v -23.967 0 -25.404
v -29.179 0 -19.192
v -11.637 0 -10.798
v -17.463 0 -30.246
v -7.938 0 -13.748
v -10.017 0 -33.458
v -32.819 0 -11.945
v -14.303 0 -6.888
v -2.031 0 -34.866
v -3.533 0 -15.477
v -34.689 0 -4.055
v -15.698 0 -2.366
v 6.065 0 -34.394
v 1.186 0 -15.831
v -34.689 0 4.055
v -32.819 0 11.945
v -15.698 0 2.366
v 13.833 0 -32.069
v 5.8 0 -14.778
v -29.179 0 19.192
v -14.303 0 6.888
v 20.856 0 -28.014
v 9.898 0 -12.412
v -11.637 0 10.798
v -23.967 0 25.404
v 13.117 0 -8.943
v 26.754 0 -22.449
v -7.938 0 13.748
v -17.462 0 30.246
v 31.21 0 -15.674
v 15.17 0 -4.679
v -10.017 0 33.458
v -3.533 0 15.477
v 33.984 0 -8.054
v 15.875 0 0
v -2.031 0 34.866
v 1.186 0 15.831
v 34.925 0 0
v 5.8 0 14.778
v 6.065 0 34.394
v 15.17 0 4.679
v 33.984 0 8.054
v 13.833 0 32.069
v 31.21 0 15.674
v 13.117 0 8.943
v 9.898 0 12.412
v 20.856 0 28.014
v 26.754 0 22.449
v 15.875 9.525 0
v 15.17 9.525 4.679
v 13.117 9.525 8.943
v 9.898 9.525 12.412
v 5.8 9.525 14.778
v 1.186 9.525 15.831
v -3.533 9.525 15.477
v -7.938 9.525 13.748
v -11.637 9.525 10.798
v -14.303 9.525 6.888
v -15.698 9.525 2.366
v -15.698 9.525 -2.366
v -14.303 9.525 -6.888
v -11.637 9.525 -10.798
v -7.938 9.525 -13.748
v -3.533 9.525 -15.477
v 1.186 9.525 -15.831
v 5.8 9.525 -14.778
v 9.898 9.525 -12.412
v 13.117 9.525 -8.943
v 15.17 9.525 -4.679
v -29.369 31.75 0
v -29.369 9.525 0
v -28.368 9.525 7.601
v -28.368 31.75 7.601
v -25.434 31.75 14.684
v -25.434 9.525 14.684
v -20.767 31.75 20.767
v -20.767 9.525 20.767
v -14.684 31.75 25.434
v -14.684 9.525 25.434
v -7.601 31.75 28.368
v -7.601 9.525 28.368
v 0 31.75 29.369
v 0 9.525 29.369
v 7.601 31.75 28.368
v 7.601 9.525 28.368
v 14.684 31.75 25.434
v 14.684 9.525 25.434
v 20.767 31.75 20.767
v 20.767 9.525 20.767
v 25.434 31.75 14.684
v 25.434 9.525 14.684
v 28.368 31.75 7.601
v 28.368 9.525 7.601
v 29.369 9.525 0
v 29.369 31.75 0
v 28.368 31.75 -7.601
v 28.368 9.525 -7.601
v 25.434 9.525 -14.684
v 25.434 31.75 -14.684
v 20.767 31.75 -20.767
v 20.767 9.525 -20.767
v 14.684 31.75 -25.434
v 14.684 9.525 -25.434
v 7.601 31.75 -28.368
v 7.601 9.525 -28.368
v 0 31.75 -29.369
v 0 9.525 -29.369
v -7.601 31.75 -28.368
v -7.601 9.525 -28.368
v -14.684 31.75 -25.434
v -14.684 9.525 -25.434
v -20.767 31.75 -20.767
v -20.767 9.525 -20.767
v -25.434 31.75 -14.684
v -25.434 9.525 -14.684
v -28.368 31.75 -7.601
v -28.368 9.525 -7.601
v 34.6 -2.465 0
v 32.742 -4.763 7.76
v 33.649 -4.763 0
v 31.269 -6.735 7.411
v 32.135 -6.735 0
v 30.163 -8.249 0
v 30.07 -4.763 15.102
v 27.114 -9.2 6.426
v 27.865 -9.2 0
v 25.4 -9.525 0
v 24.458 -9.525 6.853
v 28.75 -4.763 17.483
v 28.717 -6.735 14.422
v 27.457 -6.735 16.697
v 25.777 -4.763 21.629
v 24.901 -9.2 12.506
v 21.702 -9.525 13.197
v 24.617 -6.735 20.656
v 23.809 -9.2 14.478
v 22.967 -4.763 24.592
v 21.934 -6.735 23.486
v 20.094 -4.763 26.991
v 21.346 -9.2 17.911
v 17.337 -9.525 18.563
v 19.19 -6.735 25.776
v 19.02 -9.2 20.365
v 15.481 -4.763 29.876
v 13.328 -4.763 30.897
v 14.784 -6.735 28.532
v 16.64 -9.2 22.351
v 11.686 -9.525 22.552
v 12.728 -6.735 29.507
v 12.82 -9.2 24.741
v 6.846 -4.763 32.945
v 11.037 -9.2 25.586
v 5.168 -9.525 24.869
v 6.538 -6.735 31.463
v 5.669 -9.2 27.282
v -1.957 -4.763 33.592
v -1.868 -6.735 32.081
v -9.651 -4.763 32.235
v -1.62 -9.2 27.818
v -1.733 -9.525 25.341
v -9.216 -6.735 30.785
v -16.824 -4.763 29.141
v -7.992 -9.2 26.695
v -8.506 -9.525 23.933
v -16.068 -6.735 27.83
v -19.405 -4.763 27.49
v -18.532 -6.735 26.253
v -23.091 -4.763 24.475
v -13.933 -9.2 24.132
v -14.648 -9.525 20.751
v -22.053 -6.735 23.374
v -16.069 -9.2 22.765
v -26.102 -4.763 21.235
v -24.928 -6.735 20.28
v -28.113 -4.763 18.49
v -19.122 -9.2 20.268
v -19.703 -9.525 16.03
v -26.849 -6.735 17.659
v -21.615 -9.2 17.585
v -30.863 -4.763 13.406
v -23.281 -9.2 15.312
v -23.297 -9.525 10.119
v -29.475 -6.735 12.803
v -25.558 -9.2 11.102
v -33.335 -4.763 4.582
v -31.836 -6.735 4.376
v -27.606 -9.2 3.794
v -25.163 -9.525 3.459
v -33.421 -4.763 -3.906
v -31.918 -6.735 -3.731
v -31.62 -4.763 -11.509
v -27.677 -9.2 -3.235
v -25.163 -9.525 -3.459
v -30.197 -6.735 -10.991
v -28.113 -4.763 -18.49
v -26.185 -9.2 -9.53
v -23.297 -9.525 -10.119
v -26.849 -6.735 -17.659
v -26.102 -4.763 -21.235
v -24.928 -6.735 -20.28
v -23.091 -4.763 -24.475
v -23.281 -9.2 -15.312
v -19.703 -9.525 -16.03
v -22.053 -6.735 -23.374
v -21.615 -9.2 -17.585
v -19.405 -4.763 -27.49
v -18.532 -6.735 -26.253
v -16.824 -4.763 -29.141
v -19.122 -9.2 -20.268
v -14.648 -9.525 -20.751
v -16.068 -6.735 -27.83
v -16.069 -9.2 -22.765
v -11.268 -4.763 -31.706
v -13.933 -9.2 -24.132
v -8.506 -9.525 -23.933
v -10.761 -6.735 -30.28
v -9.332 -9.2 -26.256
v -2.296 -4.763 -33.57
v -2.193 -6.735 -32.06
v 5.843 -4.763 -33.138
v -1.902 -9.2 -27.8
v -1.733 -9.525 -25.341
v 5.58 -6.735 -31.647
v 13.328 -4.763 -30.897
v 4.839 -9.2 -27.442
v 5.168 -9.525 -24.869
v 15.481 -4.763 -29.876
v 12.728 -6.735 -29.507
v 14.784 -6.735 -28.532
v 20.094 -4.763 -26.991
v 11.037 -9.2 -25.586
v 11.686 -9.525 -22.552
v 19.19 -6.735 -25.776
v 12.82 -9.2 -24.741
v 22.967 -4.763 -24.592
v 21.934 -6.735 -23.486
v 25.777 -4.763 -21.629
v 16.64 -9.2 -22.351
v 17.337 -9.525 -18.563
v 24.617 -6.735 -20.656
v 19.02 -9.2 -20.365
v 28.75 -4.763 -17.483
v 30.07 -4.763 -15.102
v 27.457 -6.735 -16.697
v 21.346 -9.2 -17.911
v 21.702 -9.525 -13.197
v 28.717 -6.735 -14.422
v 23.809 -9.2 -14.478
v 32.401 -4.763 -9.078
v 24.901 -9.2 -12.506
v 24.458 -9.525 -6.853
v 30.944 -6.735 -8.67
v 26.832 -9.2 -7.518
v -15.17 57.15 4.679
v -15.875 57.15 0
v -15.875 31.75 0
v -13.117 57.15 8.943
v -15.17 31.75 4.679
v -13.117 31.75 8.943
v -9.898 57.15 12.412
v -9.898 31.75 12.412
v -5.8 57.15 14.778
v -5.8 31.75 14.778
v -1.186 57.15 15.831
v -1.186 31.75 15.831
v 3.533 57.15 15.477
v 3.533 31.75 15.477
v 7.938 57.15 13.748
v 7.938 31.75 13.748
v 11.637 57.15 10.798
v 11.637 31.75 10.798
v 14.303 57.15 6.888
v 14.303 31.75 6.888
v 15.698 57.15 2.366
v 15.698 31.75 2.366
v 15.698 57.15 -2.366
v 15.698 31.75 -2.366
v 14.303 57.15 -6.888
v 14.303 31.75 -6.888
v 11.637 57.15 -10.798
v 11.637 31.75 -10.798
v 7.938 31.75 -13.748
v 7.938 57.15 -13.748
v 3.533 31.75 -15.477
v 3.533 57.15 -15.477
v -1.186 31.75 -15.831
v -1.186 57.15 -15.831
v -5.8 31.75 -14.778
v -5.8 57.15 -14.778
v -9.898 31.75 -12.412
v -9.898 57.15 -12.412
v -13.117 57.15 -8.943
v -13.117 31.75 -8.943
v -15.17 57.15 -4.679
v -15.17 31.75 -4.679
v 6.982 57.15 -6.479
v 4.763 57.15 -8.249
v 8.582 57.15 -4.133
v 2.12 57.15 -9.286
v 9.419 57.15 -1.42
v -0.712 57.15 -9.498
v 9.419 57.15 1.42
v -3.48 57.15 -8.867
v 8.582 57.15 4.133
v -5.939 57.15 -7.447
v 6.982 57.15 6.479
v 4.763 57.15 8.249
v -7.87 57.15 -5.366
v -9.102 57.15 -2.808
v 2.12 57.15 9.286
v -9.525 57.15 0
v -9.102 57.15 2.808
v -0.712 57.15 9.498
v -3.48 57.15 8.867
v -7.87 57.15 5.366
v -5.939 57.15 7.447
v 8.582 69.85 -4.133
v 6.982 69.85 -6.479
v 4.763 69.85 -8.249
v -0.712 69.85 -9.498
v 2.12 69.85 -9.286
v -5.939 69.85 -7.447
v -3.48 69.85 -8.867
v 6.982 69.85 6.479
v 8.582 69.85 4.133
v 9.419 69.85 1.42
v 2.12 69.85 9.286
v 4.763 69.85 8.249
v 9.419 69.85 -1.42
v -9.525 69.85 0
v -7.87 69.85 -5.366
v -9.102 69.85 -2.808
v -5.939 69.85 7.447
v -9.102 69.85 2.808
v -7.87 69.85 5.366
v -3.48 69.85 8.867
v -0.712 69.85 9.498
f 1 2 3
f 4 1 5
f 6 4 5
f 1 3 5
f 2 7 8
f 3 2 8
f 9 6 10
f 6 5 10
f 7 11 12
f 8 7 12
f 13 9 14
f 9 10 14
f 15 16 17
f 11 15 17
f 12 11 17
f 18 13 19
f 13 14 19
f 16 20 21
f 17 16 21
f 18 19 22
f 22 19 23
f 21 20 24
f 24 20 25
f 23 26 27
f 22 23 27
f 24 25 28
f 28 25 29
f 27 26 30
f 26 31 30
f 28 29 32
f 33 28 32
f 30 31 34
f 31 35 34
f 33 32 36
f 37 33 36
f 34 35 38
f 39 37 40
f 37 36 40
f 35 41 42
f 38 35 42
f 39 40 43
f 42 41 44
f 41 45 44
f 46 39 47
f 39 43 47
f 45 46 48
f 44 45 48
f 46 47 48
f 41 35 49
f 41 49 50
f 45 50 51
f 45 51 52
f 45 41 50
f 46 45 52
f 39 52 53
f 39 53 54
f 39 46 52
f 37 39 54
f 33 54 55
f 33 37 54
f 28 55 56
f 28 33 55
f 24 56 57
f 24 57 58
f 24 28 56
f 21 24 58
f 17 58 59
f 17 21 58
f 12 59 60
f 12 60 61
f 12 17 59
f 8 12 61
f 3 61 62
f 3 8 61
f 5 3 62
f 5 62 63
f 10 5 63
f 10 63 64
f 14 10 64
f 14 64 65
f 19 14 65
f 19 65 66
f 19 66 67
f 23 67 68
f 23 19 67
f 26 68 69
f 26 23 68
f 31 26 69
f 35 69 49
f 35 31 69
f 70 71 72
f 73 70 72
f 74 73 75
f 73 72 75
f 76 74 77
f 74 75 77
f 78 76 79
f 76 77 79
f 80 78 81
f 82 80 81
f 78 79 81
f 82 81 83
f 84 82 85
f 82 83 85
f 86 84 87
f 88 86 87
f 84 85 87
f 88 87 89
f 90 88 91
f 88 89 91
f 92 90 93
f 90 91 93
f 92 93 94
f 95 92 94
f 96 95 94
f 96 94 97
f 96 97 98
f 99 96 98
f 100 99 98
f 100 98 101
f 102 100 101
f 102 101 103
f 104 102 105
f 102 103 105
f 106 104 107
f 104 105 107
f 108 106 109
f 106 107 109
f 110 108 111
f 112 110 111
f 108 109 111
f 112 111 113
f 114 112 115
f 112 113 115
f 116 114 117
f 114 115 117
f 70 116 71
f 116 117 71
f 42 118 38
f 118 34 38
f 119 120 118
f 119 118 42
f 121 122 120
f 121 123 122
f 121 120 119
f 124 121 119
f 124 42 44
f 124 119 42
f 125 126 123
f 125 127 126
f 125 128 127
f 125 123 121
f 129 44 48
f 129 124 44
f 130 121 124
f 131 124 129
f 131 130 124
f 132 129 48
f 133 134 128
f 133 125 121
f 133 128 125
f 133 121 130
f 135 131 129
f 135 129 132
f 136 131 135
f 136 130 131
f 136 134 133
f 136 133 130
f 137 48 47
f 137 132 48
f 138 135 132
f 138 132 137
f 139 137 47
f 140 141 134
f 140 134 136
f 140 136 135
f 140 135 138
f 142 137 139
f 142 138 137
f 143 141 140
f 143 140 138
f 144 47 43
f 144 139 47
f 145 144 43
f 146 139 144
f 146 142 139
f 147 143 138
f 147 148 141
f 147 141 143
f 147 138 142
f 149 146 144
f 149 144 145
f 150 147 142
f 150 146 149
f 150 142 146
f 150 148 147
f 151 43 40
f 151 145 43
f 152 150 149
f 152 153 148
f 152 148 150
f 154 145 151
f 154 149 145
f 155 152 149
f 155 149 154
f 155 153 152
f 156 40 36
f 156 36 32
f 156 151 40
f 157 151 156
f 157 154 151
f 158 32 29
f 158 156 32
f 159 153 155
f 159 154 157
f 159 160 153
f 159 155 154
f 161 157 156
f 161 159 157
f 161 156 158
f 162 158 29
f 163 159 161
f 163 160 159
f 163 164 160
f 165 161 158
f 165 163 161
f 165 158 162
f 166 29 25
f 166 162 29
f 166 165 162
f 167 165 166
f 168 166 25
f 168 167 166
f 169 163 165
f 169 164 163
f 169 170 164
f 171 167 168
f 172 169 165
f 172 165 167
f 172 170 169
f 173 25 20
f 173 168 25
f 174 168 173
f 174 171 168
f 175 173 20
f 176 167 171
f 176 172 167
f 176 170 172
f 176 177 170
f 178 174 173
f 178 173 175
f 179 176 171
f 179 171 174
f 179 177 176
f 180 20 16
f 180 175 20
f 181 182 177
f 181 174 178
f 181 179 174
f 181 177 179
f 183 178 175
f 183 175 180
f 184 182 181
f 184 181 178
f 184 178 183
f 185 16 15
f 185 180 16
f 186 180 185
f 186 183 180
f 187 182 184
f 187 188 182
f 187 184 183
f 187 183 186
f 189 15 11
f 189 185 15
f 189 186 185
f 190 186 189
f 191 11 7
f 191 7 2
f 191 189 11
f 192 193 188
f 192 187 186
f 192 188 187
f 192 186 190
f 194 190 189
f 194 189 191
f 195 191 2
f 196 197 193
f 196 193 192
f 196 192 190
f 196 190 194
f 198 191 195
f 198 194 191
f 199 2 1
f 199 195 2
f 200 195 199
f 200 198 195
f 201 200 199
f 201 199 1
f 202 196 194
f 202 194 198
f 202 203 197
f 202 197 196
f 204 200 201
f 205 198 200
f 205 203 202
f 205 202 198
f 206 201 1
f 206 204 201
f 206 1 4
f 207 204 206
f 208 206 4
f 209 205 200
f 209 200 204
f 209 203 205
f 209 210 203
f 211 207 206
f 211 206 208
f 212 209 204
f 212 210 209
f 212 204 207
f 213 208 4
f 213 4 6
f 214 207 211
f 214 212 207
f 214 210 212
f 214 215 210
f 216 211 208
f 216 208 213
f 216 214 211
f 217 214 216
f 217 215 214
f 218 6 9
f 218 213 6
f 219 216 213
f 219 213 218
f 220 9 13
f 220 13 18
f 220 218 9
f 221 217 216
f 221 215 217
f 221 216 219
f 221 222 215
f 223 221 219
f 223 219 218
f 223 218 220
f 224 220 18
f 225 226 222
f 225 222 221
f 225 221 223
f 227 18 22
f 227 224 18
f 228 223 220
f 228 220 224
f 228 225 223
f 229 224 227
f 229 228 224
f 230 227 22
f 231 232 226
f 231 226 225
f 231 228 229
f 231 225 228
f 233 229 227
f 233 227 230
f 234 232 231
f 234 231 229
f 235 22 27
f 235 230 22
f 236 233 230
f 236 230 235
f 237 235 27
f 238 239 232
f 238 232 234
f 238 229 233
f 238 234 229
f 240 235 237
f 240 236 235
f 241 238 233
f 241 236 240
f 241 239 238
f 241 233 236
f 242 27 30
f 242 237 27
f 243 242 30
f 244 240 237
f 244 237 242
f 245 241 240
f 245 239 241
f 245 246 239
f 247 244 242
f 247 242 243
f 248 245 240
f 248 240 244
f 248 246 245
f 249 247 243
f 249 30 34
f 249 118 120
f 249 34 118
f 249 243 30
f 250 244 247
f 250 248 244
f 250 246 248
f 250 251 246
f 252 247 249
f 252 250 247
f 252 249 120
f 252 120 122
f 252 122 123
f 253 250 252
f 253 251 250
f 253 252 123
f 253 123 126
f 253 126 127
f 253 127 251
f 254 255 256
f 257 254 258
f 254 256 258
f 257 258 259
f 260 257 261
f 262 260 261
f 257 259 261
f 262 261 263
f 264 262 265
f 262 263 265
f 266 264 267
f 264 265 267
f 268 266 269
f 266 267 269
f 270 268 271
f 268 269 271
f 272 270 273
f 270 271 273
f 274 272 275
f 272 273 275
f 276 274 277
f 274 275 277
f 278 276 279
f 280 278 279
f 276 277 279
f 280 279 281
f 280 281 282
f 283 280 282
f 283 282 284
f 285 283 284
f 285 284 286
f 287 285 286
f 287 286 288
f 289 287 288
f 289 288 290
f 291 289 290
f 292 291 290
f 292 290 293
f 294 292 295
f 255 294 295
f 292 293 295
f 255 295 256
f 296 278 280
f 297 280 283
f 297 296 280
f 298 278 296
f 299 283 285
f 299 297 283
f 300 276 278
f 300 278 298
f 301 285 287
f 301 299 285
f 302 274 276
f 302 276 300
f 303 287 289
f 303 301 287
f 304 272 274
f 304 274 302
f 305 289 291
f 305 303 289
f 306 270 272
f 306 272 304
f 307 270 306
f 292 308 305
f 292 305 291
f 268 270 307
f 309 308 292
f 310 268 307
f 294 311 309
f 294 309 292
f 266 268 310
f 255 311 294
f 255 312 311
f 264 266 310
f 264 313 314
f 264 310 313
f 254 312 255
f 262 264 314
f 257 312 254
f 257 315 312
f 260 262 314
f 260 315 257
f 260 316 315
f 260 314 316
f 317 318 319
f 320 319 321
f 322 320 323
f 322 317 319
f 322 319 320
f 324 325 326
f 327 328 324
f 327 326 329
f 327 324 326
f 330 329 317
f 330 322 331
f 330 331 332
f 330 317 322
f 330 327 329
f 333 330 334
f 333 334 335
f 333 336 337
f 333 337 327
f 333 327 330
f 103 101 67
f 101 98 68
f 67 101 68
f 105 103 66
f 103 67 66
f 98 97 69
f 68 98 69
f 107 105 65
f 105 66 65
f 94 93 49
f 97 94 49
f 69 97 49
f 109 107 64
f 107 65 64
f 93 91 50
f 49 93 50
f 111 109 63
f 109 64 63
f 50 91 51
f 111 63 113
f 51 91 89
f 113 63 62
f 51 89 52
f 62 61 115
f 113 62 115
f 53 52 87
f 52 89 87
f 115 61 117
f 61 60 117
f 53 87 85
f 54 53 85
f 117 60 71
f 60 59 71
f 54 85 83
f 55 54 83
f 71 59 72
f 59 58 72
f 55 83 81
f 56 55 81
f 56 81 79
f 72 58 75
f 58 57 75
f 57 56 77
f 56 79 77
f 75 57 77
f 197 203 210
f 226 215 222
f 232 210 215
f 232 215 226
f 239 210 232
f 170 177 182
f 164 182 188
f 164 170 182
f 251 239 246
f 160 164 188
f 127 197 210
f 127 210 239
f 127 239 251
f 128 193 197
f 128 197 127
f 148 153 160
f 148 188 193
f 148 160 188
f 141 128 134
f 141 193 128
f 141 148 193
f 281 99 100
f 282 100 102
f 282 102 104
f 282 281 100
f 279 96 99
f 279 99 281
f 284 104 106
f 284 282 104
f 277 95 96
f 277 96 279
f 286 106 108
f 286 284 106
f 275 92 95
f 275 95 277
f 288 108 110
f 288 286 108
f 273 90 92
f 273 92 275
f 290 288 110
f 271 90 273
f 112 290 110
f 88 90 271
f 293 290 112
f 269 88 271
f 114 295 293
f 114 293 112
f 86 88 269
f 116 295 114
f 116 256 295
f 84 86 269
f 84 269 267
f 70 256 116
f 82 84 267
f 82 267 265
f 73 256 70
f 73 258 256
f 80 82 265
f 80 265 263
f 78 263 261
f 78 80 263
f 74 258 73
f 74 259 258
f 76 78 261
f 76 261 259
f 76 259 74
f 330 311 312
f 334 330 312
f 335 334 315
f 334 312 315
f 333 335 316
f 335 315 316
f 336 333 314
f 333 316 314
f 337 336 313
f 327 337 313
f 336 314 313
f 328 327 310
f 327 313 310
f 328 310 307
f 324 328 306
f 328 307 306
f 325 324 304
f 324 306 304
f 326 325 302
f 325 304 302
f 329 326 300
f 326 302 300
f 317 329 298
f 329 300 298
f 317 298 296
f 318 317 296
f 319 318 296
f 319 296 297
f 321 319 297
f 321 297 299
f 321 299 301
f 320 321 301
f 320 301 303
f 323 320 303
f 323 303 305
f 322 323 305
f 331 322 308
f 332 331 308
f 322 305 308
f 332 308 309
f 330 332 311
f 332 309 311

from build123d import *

# Parameters (mm, degrees)
F0_R     = 15.875
F1_DEPTH = 9.525
F2_R     = 29.36875
F3_DEPTH = 22.225
F4_R     = 15.875
F5_DEPTH = 25.4
F6_R     = 9.525
F7_DEPTH = 12.7
F8_R     = 34.925
F9_DEPTH = 9.525
F10_R    = 9.52499


# Not quite as in the source:
# - a fillet or chamfer is up to 0.001 mm smaller than in the source, because OpenCascade refuses the exact size


with BuildPart() as f1:
    # F0 (on Front) → F1 (new body)
    with BuildSketch(Plane.XZ):
        Circle(F0_R)
    extrude(amount=-F1_DEPTH)

    # F2 (on face) → F3 (join)
    with BuildSketch(Plane(origin=(0, 9.525, 0), x_dir=(-1, 0, 0), z_dir=(0, 1, 0))):
        Circle(F2_R)
    extrude(amount=F3_DEPTH)

    # F4 (on face) → F5 (join)
    with BuildSketch(Plane(origin=(0, 31.75, 0), x_dir=(-1, 0, 0), z_dir=(0, 1, 0))):
        Circle(F4_R)
    extrude(amount=F5_DEPTH)

    # F6 (on face) → F7 (join)
    with BuildSketch(Plane(origin=(0, 57.15, 0), x_dir=(-1, 0, 0), z_dir=(0, 1, 0))):
        Circle(F6_R)
    extrude(amount=F7_DEPTH)

    # F8 (on face) → F9 (join)
    with BuildSketch(Plane.XZ):
        Circle(F8_R)
    extrude(amount=F9_DEPTH)

    # F10 (radius 9.525 in the source; OpenCascade refuses exactly that, so slightly less here)
    f10_edges = [f1.edges().sort_by_distance(p)[0] for p in [
        (-34.925, -9.525, 0),
    ]]
    fillet(f10_edges, radius=F10_R)


solid = f1.part
